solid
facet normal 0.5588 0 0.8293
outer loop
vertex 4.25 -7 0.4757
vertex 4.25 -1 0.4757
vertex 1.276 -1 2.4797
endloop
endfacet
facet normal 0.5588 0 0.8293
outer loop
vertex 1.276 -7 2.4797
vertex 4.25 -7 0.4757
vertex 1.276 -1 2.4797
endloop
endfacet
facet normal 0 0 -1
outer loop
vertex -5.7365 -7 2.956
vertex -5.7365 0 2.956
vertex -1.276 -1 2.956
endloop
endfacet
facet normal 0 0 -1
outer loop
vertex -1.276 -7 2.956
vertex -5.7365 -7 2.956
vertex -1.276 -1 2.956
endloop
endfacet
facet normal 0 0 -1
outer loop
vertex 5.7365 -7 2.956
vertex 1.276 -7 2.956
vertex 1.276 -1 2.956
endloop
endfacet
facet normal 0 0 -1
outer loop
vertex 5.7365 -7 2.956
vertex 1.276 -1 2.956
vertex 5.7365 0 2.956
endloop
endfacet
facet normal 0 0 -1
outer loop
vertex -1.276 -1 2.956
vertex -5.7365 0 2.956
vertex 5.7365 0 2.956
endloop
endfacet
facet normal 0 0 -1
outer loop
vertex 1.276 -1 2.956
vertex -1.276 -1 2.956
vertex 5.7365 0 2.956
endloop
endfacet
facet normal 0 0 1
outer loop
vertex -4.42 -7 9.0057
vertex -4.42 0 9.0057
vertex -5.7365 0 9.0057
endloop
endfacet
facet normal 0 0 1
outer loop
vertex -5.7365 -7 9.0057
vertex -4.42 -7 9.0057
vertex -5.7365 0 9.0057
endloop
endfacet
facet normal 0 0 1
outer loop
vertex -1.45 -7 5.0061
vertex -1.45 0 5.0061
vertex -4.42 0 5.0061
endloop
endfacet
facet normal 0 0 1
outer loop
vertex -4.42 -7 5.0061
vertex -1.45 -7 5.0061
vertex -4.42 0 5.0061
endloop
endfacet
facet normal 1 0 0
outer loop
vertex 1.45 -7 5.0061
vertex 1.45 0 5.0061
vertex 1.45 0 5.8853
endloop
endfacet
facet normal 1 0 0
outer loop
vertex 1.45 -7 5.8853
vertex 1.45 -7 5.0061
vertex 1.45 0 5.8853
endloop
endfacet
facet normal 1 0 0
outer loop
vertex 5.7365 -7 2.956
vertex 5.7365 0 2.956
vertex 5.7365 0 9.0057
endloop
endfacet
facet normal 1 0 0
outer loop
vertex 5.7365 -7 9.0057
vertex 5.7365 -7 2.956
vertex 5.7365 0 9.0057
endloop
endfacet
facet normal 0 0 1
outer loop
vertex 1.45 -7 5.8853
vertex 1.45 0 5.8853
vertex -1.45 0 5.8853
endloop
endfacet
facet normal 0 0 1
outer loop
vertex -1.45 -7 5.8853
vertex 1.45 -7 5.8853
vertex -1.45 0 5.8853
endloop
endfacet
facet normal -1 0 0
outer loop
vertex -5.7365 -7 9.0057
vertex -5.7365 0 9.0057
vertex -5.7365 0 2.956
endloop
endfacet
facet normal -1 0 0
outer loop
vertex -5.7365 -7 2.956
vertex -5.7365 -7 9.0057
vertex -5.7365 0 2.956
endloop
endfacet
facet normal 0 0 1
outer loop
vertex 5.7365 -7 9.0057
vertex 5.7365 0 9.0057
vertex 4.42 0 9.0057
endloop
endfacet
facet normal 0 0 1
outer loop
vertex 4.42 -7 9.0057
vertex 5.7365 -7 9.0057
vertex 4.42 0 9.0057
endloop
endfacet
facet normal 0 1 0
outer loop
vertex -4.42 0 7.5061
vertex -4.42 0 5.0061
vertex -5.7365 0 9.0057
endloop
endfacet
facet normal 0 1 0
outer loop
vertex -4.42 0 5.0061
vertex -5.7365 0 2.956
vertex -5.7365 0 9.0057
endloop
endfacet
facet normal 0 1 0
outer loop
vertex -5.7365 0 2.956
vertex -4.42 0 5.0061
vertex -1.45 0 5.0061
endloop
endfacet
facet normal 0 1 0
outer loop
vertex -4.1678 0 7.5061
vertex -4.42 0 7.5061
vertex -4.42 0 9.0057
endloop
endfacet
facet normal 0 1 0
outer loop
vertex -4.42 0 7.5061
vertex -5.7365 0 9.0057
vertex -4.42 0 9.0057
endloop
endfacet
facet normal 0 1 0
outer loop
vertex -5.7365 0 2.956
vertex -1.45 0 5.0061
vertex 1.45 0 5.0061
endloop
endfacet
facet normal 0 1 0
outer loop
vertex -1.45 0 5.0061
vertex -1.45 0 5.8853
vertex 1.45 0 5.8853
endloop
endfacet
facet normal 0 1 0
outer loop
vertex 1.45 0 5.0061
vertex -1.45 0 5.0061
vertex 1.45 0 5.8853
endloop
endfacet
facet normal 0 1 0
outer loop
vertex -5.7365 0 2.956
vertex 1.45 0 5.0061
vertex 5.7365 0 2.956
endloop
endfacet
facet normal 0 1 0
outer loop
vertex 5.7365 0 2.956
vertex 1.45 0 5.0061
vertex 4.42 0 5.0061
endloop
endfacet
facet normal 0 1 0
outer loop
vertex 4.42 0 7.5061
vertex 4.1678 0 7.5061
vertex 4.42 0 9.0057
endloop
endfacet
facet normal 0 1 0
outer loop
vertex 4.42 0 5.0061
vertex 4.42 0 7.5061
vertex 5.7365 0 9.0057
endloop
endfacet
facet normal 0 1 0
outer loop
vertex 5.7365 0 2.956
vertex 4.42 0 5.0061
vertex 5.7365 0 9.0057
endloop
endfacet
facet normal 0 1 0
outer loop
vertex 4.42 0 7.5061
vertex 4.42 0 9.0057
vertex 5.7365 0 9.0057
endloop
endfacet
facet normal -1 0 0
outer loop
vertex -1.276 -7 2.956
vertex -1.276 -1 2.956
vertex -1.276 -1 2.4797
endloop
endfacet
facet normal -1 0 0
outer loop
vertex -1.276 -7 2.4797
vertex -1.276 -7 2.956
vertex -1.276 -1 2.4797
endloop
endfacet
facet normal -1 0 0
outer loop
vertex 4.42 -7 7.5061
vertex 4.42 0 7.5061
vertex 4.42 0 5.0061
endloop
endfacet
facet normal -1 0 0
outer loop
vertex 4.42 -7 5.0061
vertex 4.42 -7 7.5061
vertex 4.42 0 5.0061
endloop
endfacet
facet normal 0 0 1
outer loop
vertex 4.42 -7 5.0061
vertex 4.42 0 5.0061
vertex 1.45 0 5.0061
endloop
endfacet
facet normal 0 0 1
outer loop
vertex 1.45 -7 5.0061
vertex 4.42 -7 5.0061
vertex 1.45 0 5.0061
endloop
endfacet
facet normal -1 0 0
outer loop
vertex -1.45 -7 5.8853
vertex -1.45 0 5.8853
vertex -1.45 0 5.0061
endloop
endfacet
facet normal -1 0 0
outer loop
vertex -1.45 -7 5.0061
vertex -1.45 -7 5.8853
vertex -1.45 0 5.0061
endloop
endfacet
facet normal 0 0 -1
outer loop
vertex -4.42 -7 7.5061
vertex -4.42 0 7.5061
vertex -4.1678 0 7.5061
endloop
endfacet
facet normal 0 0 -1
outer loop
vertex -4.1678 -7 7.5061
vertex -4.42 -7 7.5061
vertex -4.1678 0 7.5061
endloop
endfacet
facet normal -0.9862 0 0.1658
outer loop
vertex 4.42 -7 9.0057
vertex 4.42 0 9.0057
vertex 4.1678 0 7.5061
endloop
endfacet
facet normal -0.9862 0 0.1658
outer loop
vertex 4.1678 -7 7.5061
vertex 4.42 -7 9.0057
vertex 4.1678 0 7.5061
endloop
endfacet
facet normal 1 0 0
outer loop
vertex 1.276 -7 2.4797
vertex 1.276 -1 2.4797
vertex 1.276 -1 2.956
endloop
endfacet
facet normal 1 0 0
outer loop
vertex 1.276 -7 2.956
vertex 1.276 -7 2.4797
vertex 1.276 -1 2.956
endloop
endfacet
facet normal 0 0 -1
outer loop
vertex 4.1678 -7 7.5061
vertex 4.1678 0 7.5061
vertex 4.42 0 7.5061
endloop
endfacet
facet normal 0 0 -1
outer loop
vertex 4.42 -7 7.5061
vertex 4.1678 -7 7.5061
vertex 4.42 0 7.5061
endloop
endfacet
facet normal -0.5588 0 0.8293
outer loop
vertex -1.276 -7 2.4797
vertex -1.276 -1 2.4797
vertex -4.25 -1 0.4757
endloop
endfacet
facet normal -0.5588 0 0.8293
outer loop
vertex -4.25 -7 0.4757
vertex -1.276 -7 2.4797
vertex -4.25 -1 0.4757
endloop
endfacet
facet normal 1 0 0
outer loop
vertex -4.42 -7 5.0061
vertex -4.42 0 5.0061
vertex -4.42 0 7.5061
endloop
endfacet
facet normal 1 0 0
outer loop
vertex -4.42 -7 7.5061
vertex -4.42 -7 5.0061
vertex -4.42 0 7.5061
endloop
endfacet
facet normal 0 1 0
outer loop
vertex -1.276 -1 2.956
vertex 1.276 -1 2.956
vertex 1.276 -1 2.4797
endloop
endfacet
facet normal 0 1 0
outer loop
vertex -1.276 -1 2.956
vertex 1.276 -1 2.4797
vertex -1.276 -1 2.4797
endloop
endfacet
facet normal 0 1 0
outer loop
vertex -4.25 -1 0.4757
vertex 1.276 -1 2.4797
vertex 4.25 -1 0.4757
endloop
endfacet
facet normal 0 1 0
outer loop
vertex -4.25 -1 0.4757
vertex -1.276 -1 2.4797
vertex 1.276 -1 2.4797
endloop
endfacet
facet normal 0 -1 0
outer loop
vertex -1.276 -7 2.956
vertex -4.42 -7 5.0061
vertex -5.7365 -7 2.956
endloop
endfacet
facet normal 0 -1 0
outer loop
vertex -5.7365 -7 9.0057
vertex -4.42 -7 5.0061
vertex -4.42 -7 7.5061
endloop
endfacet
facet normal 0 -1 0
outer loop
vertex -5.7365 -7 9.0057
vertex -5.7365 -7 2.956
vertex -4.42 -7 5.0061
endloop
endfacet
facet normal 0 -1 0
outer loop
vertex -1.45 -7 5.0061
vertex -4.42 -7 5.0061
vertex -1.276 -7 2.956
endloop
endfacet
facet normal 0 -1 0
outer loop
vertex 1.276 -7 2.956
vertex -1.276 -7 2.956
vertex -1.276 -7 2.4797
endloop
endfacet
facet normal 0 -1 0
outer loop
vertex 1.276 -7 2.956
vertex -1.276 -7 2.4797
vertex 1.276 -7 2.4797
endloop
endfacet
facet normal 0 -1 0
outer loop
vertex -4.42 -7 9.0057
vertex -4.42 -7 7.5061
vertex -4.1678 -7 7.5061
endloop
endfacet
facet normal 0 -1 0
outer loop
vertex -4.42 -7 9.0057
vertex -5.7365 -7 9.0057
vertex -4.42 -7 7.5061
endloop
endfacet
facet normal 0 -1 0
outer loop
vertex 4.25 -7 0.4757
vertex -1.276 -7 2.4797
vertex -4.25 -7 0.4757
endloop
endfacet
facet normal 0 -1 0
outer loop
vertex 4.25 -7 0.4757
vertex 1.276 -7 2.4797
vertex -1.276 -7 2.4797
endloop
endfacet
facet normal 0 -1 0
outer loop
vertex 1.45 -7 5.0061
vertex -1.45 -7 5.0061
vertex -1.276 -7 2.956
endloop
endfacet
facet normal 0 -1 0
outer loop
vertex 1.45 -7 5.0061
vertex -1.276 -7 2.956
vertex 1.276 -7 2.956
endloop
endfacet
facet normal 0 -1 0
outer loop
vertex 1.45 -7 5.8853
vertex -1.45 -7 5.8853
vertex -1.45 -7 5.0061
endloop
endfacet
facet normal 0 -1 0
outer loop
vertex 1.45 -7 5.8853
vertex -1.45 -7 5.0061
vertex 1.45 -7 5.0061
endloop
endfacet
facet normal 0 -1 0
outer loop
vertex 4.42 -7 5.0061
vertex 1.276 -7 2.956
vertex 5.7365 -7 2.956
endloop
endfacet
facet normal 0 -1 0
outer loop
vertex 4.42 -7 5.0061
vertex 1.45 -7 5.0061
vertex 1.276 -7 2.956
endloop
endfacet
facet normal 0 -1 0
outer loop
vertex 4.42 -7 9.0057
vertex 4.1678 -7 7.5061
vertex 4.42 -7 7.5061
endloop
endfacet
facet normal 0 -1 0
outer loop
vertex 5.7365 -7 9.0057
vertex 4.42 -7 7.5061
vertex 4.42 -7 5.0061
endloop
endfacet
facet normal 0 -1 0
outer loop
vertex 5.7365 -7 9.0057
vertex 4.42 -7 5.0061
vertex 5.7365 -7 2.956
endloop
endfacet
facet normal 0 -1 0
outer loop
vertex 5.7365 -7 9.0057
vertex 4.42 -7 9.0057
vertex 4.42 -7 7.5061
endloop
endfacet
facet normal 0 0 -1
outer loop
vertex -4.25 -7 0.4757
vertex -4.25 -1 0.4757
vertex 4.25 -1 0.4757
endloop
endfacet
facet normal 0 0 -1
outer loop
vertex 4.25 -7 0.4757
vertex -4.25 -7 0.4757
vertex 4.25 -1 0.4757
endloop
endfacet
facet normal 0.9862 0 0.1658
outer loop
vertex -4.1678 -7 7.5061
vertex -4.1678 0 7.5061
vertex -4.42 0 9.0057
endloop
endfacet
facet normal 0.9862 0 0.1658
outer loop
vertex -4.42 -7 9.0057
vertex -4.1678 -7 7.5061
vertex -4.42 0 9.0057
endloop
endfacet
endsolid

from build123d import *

# Parameters (mm, degrees)
F1_DEPTH = 7
F3_DEPTH = 1


# Not quite as in the source:
# - ends of sketch curves that miss each other by under 0.0002 mm in the source are joined


with BuildPart() as f1:
    # F0 (on Front) → F1 (new body)
    with BuildSketch(Plane.XZ):
        Polygon((-1.4500004135, 5.0060716327), (-2.9995756401, 5.0060716327), (-4.4200004135, 5.0060716327), (-4.4200004135, 7.5060716327), (-4.1678175591, 7.5060716327), (-4.4200004135, 9.0056643691), (-5.7365144081, 9.0056643691), (-5.7365144081, 2.9560173731), (-1.276, 2.9560173731), (-1.276, 2.479687877), (-4.25, 0.475687877), (0, 0.475687877), (4.25, 0.475687877), (1.276, 2.479687877), (1.276, 2.9560173731), (5.7365144081, 2.9560173731), (5.7365144081, 9.0056643691), (4.4200002068, 9.0056643691), (4.1678173524, 7.5060716327), (4.4200002068, 7.5060716327), (4.4200002068, 5.0060716327), (2.9995754333, 5.0060716327), (1.4500002068, 5.0060716327), (2.068e-07, 5.0060716327), align=None)
        Polygon((-1.4500004135, 5.8852624949), (-1.4500004135, 5.0060716327), (-4.135e-07, 5.0060716327), (1.4500002068, 5.0060716327), (1.4500002068, 5.8852624949), (2.068e-07, 5.8852624949), align=None)
    extrude(amount=F1_DEPTH)

    # F2 (on face) → F3 (cut)
    with BuildSketch(Plane(origin=(0, 0, 0), x_dir=(-1, 0, 0), z_dir=(0, 1, 0))):
        Polygon((1.276, 2.9560173731), (-1.276, 2.9560173731), (-1.276, 2.479687877), (-4.25, 0.475687877), (4.25, 0.475687877), (1.276, 2.479687877), align=None)
    extrude(amount=-F3_DEPTH, mode=Mode.SUBTRACT)


solid = f1.part
